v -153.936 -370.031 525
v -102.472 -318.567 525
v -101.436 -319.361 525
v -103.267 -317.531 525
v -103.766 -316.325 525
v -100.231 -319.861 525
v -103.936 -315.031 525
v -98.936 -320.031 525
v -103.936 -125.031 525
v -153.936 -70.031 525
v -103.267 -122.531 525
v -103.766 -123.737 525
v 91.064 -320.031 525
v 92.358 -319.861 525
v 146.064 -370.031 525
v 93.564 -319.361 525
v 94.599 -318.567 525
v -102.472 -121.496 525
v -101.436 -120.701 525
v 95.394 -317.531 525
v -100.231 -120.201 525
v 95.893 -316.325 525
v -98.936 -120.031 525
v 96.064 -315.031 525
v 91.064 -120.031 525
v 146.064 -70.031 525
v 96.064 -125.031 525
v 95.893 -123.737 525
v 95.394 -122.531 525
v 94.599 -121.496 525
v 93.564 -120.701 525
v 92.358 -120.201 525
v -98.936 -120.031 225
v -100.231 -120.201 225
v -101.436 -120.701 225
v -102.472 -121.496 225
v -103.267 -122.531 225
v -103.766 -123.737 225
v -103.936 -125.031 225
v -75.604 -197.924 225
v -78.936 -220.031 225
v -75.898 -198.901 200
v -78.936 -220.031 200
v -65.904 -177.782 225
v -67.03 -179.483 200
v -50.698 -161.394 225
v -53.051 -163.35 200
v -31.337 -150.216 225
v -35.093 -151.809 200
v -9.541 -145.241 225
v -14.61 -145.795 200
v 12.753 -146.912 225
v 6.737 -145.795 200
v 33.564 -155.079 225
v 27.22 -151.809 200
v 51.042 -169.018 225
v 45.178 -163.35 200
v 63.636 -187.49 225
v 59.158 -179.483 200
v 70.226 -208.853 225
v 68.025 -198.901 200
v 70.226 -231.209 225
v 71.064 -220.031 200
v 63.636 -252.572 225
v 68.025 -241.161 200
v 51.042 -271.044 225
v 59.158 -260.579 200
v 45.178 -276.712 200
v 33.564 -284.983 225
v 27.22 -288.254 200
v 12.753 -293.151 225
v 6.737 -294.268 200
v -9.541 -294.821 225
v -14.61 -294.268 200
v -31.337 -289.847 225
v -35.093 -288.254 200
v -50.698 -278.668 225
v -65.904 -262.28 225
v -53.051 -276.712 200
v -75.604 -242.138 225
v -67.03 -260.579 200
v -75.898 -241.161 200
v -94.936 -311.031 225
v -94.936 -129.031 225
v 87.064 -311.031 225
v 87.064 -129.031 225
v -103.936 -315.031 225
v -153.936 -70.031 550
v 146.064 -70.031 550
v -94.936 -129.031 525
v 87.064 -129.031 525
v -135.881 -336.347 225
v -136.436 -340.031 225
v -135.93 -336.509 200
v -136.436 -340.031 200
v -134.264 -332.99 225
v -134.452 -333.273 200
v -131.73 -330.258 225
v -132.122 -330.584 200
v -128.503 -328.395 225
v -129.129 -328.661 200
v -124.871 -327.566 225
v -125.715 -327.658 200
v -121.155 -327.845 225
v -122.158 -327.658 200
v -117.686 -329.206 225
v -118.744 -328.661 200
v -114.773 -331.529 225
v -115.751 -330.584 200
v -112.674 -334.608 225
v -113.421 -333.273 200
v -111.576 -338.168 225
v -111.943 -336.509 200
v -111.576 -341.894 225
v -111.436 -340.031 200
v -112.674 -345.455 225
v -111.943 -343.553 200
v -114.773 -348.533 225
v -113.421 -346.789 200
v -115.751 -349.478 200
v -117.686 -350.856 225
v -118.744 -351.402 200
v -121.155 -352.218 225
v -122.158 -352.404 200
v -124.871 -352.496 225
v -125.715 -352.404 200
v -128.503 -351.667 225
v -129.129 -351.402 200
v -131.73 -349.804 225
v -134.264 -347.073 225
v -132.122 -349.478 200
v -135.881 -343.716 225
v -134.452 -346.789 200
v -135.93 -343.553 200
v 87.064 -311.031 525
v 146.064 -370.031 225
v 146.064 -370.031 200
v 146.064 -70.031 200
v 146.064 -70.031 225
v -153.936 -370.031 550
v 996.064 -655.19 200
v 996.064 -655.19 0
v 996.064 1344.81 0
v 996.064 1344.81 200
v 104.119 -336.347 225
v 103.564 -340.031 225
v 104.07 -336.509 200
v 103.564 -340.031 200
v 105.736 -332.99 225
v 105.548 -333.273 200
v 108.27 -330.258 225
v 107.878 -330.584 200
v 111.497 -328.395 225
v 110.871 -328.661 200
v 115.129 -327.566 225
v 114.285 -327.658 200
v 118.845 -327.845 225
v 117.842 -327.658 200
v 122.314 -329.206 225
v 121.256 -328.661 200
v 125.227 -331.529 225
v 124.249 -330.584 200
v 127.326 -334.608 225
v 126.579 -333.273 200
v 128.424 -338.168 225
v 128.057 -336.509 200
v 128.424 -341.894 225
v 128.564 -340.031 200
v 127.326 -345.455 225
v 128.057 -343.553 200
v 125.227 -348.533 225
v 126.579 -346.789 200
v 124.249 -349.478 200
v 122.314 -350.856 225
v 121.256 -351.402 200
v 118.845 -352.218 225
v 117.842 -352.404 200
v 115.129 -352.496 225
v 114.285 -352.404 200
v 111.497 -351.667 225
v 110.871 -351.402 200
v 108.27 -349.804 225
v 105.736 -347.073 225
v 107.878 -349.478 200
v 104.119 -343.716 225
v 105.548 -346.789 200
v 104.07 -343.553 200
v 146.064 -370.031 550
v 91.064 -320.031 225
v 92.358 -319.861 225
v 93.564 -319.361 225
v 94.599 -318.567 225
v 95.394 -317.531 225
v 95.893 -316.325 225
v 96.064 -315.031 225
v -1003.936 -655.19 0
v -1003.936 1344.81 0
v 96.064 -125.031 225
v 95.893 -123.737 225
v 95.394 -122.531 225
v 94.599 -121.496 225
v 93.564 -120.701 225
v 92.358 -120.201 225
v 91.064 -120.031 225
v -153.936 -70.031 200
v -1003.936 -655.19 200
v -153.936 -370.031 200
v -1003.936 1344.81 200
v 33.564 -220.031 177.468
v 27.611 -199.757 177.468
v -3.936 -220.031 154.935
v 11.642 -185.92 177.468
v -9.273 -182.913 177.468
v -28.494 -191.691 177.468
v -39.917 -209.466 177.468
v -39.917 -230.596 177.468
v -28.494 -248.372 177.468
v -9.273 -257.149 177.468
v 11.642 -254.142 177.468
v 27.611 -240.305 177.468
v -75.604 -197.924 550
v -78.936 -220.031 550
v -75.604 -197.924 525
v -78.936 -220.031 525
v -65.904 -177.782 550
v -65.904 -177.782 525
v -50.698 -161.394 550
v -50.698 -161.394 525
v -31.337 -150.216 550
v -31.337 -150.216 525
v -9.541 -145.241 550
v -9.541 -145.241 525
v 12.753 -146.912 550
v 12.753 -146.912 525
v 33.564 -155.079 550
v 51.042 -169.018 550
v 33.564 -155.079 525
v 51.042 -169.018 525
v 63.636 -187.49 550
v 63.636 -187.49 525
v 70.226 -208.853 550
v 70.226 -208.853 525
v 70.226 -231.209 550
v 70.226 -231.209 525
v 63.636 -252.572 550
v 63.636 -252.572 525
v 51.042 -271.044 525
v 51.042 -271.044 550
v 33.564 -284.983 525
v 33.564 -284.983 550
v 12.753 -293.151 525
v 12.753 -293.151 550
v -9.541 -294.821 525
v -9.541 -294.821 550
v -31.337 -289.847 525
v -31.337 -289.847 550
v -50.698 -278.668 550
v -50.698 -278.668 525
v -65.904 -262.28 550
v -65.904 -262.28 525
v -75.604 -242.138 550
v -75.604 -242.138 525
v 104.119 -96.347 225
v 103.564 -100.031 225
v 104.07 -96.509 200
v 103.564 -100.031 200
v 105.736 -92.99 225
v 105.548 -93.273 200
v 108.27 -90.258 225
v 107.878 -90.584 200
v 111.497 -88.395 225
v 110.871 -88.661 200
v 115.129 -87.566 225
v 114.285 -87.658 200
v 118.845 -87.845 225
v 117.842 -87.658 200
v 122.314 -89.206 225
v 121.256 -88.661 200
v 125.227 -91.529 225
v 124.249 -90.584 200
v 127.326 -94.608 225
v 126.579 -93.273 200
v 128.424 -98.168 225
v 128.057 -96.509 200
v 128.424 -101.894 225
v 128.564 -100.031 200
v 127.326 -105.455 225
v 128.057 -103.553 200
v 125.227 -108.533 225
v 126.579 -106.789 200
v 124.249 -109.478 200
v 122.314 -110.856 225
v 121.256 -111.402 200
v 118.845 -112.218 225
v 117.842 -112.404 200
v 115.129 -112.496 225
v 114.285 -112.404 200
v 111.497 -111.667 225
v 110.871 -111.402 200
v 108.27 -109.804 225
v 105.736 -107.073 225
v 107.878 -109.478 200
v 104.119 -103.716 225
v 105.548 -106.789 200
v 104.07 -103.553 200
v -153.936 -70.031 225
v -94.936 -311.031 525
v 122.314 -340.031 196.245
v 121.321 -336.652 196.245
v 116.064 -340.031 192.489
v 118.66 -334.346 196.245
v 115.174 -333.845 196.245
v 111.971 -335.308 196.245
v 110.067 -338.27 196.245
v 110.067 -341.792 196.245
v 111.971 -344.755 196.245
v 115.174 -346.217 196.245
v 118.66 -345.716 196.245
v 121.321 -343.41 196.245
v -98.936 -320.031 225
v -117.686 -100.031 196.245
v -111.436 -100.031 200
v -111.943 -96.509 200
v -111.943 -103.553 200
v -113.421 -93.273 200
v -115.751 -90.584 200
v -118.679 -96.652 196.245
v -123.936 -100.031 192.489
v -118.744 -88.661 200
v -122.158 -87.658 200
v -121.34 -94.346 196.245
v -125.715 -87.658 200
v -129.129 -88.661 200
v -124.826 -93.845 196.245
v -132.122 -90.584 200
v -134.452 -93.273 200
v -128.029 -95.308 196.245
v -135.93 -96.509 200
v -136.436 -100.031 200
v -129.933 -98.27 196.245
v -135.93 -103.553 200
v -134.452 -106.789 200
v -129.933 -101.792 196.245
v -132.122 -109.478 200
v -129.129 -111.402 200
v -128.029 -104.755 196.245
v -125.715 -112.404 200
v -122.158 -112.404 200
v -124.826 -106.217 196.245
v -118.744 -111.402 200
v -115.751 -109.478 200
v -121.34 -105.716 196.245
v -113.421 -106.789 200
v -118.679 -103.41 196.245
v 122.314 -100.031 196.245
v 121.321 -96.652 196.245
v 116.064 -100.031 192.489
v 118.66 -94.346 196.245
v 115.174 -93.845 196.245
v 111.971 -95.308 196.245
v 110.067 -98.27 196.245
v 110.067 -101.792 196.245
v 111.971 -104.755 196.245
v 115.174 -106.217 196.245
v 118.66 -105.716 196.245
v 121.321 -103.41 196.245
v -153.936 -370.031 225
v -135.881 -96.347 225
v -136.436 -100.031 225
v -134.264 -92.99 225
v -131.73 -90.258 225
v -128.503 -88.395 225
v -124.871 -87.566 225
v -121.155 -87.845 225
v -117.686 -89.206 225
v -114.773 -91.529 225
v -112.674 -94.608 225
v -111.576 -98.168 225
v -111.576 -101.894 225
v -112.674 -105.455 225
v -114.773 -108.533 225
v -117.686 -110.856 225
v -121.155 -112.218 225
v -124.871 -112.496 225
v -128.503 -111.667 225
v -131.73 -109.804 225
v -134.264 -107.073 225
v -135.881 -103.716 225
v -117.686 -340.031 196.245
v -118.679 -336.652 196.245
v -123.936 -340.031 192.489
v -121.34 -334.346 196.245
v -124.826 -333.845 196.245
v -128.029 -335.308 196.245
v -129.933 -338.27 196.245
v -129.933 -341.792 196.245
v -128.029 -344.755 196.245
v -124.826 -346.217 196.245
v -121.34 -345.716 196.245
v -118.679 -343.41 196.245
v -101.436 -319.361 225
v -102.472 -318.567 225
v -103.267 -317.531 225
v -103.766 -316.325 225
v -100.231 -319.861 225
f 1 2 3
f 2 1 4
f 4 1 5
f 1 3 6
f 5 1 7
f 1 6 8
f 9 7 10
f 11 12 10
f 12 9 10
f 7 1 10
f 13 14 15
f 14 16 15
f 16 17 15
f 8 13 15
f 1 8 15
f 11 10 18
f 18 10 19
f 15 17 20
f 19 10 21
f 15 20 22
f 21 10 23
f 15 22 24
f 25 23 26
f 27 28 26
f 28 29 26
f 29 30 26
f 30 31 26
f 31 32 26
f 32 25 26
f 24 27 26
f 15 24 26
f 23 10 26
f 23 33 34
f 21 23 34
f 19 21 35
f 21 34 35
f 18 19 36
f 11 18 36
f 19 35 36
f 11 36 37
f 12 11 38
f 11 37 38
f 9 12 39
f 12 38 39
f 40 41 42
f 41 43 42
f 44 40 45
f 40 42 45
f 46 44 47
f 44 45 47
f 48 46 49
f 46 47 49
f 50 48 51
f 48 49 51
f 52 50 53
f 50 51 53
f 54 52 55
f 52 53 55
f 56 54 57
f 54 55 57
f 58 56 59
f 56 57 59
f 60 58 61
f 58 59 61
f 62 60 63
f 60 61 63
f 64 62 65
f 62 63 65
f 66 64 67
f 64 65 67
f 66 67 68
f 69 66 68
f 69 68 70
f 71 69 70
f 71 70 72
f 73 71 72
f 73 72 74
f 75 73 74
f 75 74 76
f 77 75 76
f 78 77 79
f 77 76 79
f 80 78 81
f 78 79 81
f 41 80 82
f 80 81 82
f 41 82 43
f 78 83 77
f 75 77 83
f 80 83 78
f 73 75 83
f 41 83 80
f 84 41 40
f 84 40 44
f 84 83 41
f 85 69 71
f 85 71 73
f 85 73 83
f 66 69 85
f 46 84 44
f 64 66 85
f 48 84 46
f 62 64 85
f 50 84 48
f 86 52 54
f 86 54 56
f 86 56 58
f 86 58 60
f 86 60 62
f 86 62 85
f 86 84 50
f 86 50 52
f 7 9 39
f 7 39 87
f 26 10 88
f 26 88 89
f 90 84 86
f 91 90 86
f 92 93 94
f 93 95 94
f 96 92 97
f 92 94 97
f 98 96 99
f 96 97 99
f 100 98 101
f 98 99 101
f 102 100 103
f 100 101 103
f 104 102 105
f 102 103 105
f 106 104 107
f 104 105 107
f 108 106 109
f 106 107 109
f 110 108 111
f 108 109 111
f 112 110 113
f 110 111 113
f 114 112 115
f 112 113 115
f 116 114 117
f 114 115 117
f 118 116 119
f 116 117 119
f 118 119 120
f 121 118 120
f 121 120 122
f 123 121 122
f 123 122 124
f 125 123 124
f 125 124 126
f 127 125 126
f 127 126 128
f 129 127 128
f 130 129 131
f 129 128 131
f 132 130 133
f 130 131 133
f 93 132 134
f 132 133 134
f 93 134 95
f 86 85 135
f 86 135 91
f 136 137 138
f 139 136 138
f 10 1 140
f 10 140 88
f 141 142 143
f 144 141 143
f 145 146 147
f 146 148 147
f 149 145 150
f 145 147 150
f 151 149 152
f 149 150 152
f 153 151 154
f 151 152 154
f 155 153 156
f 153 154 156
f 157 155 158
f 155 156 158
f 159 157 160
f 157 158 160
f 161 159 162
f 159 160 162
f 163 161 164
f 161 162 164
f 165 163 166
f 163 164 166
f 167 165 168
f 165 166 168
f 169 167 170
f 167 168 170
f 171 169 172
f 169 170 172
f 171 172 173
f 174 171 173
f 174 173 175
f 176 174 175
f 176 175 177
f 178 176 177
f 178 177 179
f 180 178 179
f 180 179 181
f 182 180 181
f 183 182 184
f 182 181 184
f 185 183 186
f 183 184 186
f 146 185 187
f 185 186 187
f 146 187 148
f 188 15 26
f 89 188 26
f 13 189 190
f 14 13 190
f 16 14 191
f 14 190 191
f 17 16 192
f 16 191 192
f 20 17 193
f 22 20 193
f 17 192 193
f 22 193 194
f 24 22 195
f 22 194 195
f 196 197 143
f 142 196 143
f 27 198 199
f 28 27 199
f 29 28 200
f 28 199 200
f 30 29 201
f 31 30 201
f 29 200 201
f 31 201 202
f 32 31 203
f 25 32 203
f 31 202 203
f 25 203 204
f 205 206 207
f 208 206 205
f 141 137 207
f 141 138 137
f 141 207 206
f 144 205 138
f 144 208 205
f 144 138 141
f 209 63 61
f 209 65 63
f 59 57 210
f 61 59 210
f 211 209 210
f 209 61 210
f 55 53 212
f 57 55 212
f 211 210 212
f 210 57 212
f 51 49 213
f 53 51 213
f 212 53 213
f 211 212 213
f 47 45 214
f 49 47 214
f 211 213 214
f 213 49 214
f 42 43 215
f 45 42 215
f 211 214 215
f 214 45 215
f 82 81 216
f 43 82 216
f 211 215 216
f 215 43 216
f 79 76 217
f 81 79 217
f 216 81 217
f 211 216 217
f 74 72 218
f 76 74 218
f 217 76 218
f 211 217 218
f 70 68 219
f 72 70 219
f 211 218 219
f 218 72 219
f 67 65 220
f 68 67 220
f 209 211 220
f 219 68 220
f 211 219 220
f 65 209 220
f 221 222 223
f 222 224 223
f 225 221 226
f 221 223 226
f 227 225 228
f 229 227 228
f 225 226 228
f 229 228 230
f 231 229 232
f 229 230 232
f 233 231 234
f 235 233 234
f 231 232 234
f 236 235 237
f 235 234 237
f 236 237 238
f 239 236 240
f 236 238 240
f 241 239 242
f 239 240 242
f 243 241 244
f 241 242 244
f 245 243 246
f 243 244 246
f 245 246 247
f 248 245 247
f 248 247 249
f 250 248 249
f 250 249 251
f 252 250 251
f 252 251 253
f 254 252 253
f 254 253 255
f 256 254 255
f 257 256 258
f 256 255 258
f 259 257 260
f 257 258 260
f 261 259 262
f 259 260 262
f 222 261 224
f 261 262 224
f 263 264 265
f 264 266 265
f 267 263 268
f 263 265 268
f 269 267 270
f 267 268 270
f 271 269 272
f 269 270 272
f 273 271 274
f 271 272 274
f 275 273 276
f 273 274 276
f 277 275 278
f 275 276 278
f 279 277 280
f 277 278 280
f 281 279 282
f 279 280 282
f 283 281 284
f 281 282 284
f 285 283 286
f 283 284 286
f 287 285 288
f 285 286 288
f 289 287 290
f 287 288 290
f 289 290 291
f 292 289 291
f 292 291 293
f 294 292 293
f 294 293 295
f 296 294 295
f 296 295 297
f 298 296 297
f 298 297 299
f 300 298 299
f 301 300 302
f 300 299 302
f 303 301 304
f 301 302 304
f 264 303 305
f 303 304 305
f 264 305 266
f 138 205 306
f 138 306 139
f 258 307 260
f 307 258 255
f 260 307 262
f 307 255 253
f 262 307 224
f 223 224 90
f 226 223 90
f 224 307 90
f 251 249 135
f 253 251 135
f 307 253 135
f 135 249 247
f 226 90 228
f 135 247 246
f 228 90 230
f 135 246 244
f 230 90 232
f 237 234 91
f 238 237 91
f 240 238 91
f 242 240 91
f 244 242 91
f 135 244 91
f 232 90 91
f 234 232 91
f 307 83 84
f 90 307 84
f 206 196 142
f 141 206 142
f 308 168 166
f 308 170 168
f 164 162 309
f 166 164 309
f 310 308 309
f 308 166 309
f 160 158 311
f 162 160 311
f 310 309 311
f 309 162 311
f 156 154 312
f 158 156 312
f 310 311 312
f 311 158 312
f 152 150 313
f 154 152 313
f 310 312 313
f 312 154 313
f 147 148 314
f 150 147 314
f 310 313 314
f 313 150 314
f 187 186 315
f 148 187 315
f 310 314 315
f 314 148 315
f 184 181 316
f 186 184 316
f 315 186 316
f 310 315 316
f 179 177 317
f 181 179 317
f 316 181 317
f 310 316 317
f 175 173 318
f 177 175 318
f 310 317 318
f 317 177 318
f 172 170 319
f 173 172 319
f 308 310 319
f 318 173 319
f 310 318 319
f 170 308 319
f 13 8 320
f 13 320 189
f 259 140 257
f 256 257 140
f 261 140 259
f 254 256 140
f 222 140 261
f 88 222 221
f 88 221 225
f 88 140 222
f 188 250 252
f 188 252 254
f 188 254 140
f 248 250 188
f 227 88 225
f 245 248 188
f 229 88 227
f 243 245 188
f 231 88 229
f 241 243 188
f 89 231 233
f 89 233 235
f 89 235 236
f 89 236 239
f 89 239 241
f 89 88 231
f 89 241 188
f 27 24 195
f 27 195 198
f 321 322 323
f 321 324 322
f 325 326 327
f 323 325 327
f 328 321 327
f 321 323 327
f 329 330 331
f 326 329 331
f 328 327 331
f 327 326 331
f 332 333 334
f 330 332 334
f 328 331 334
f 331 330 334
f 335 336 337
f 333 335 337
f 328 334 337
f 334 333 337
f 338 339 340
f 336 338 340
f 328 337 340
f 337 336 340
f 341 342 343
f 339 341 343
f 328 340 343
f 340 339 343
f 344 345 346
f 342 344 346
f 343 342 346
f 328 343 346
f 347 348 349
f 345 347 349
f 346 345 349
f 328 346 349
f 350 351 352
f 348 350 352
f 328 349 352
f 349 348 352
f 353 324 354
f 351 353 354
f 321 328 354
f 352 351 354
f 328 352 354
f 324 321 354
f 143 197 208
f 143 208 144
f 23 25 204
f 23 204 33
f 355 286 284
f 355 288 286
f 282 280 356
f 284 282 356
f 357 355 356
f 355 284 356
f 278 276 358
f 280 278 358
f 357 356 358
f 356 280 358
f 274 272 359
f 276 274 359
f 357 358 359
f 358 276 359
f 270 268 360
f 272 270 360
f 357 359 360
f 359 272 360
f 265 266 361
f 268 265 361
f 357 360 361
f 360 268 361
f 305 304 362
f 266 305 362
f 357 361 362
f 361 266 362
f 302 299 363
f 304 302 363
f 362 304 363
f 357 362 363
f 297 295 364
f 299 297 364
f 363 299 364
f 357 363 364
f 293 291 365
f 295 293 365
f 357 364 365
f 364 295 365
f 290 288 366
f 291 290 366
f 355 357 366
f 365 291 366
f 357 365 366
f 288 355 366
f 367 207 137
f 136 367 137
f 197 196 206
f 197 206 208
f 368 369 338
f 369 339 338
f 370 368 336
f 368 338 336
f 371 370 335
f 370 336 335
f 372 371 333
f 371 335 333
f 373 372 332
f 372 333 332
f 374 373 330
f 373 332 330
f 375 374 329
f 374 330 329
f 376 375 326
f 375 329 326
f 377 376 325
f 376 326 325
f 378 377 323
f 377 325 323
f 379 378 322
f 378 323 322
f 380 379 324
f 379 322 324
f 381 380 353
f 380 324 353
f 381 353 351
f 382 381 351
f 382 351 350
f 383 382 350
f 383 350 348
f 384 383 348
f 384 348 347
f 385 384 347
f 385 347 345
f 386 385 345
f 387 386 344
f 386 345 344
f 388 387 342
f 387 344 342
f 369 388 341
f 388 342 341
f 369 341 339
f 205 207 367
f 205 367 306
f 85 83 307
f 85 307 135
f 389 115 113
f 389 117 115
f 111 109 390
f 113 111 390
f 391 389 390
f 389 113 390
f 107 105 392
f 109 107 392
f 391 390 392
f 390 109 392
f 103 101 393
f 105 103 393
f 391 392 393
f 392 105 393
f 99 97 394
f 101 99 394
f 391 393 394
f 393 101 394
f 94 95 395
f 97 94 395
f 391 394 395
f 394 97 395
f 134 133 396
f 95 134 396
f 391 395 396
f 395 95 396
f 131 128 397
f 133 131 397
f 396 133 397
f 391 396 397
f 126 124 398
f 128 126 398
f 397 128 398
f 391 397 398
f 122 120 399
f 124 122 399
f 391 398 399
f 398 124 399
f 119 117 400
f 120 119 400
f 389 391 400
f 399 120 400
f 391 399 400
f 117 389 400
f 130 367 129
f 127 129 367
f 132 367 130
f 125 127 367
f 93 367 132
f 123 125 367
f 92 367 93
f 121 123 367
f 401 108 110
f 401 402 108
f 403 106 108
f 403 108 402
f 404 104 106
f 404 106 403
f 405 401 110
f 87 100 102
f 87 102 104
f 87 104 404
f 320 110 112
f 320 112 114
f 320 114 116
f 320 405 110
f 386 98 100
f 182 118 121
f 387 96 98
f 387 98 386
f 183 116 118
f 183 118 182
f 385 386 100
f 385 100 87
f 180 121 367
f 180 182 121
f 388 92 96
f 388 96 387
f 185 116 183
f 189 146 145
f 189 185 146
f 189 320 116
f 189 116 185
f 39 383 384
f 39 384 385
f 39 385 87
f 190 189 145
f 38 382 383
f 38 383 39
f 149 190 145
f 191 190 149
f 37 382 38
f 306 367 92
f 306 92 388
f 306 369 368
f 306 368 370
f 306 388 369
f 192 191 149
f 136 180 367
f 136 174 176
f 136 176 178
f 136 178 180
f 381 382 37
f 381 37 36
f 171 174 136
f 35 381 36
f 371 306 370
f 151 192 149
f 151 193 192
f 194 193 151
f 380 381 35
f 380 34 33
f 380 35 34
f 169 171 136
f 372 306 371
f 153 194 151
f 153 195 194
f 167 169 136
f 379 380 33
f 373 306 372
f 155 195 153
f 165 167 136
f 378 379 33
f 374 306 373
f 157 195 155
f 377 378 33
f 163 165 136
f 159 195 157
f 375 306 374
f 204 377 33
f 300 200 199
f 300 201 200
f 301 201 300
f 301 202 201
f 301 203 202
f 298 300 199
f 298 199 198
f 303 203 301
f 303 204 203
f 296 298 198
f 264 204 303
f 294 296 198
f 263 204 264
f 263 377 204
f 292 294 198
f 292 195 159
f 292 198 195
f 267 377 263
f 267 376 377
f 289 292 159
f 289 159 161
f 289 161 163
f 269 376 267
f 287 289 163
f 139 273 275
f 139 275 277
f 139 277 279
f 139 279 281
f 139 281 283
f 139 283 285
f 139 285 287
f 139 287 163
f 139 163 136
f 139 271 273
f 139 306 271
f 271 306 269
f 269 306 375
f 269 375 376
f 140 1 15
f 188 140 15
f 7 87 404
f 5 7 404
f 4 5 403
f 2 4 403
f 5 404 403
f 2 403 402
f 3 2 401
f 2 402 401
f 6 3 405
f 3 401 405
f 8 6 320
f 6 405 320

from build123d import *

# Parameters (mm, degrees)
F0_W      = 2000
F0_H      = 2000
F1_DEPTH  = 200
F2_W      = 300
F2_H      = 300
F3_DEPTH  = 25
F5_D      = 25
F5_DEPTH  = 25
F5_TIP    = 7.5107577378
F6_D      = 150
F6_DEPTH  = 25
F6_TIP    = 45.0645464271
F7_W      = 182
F7_H      = 182
F8_DEPTH  = 300
F9_W      = 300
F9_H      = 300
F10_DEPTH = 25
F12_D     = 150
F12_DEPTH = 25
F12_TIP   = 45.0645464271


with BuildPart() as f1:
    # F0 (on Top) → F1 (new body)
    with BuildSketch(Plane.XY):
        with Locations((-3.9364807308, 344.8101401439)):
            Rectangle(F0_W, F0_H)
    extrude(amount=F1_DEPTH)

    # F2 (on face) → F3 (join)
    with BuildSketch(Plane.XY.offset(200)):
        with Locations((-3.9364807308, -220.0311138496)):
            Rectangle(F2_W, F2_H)
    extrude(amount=F3_DEPTH)

    # F5
    with Locations(Plane.XY.offset(225)):
        with Locations((-123.9364807308, -100.0311138496), (-123.9364807308, -340.0311138496), (116.0635192692, -340.0311138496), (116.0635192692, -100.0311138496)):
            Hole(F5_D / 2, depth=F5_DEPTH)
            with Locations((0, 0, -(F5_DEPTH + F5_TIP / 2))):  # 118° drill point
                Cone(0, F5_D / 2, F5_TIP, mode=Mode.SUBTRACT)

    # F6
    with Locations(Plane.XY.offset(225)):
        with Locations((-3.9364807308, -220.0311138496)):
            Hole(F6_D / 2, depth=F6_DEPTH)
            with Locations((0, 0, -(F6_DEPTH + F6_TIP / 2))):  # 118° drill point
                Cone(0, F6_D / 2, F6_TIP, mode=Mode.SUBTRACT)

    # F7 (on face) → F8 (join)
    with BuildSketch(Plane.XY.offset(225)):
        with BuildLine():
            Line((91.0635192692, -120.0311138496), (-98.9364807308, -120.0311138496))
            ThreePointArc((-98.9364807308, -120.0311138496), (-102.4720146367, -121.4955799437), (-103.9364807308, -125.0311138496))
            Line((-103.9364807308, -125.0311138496), (-103.9364807308, -315.0311138496))
            ThreePointArc((-103.9364807308, -315.0311138496), (-102.4720146367, -318.5666477555), (-98.9364807308, -320.0311138496))
            Line((-98.9364807308, -320.0311138496), (91.0635192692, -320.0311138496))
            ThreePointArc((91.0635192692, -320.0311138496), (94.5990531752, -318.5666477555), (96.0635192692, -315.0311138496))
            Line((96.0635192692, -315.0311138496), (96.0635192692, -125.0311138496))
            ThreePointArc((96.0635192692, -125.0311138496), (94.5990531752, -121.4955799437), (91.0635192692, -120.0311138496))
        make_face()
        with Locations((-3.9364807308, -220.0311138496)):
            Rectangle(F7_W, F7_H, mode=Mode.SUBTRACT)
    extrude(amount=F8_DEPTH)

    # F9 (on face) → F10 (join)
    with BuildSketch(Plane.XY.offset(525)):
        with Locations((-3.9364807308, -220.0311138496)):
            Rectangle(F9_W, F9_H)
    extrude(amount=F10_DEPTH)

    # F12
    with Locations(Plane.XY.offset(550)):
        with Locations((-3.9364807308, -220.0311138496)):
            Hole(F12_D / 2, depth=F12_DEPTH)
            with Locations((0, 0, -(F12_DEPTH + F12_TIP / 2))):  # 118° drill point
                Cone(0, F12_D / 2, F12_TIP, mode=Mode.SUBTRACT)


solid = f1.part
